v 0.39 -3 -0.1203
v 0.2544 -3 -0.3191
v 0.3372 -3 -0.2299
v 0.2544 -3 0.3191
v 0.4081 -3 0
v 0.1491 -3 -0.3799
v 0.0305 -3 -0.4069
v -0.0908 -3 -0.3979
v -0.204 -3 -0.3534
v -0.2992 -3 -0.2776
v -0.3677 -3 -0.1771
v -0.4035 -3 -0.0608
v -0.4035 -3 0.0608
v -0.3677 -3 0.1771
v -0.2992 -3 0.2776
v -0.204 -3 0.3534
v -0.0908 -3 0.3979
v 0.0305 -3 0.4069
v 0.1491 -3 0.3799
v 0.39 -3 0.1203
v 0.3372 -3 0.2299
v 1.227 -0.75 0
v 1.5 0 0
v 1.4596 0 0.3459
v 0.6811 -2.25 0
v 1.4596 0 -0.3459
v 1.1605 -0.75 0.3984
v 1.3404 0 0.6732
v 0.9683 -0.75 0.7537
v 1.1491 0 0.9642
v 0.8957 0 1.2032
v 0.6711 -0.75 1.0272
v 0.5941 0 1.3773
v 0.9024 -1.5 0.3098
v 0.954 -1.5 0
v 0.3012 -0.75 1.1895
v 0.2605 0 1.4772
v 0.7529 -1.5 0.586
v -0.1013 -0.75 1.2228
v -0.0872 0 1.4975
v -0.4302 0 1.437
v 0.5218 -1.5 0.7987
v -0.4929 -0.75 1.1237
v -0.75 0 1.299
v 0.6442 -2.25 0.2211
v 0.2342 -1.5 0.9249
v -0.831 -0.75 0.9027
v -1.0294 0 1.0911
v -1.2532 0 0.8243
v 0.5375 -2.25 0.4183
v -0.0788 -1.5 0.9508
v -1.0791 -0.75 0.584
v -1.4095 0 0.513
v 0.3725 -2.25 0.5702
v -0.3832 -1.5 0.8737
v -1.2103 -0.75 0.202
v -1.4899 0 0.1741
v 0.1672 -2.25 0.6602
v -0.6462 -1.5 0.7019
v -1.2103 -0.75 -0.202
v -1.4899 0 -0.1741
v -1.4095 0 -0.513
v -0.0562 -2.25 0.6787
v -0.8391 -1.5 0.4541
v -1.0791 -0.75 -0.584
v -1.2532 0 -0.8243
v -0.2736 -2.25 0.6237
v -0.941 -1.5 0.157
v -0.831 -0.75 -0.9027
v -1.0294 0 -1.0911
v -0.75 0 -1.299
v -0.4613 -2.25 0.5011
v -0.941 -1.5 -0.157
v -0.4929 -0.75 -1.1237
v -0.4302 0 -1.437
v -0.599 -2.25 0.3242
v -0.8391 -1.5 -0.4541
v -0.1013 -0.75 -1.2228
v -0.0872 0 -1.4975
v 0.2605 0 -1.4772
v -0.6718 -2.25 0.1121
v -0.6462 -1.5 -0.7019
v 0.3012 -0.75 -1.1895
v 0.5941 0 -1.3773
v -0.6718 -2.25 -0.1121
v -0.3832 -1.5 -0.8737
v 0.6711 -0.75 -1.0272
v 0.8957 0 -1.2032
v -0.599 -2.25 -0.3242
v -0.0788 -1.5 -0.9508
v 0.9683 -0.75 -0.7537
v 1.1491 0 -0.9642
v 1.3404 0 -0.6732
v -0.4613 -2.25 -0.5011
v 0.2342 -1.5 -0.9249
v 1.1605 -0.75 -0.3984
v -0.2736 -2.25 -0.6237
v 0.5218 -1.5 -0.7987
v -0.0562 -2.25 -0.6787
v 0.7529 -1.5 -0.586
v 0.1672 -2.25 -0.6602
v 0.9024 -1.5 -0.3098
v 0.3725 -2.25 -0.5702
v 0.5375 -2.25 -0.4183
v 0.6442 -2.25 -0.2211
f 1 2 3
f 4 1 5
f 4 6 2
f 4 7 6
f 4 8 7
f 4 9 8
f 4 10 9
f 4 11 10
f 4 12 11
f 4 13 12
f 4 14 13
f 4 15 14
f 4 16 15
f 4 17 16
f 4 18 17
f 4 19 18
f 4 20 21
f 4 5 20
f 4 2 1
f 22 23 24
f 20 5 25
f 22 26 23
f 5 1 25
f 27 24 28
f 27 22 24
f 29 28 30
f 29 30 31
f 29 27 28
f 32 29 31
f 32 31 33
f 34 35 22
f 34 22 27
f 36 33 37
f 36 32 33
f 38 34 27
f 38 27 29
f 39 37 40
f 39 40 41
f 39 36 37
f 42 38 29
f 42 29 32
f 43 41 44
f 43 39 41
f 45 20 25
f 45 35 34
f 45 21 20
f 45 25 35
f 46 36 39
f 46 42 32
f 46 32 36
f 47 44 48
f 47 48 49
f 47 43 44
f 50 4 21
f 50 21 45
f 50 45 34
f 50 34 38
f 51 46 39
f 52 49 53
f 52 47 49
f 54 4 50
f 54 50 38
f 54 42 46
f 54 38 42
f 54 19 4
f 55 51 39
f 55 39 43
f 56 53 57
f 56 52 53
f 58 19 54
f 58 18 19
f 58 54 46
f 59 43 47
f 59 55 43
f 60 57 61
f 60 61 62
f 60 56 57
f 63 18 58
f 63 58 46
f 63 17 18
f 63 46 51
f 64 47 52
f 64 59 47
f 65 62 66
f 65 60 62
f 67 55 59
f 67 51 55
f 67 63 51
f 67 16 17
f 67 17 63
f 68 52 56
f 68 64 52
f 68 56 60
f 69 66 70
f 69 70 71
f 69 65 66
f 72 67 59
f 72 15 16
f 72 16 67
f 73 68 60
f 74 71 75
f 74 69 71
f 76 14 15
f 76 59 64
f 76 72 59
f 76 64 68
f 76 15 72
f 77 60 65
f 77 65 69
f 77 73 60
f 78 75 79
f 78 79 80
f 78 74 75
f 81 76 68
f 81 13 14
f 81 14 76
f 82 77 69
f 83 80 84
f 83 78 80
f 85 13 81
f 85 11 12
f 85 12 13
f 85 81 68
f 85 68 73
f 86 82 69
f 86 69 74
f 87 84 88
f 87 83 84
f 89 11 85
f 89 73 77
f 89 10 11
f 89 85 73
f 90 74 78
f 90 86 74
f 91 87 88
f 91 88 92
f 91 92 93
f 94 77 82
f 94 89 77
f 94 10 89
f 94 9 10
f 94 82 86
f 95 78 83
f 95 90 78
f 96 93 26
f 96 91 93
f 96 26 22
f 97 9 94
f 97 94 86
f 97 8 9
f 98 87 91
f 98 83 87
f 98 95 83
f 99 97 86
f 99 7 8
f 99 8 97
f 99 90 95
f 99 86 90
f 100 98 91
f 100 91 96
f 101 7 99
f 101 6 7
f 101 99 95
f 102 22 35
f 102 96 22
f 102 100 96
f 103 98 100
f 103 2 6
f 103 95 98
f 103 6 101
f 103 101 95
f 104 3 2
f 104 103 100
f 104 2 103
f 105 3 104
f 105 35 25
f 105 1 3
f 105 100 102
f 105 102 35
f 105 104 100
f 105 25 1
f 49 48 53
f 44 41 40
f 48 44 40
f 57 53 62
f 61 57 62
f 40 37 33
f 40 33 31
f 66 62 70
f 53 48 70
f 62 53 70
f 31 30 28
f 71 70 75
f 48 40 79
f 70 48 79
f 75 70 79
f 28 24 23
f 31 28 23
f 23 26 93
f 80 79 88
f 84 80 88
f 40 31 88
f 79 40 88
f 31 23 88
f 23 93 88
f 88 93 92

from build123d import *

# Parameters (mm, degrees)
SKETCH1_W           = 203.69051182
SKETCH1_H           = 2
BASE_EXTRUDE_DEPTH  = 60
SKETCH3_R           = 1.5
BOSS_EXTRUDE1_DEPTH = 3
BOSS_EXTRUDE1_TAPER = 20
SKETCH4_W           = 120
SKETCH4_H           = 2
CUT_EXTRUDE1_DEPTH  = 213.364838441


with BuildPart() as part:
    # Sketch1 → Base-Extrude (new, symmetric)
    with BuildSketch(Plane.XY):
        with Locations((0, 1)):
            Rectangle(SKETCH1_W, SKETCH1_H)
    extrude(amount=BASE_EXTRUDE_DEPTH, both=True)

    # Sketch3 → Boss-Extrude1 (add)
    with BuildSketch(Plane.XZ):
        Circle(SKETCH3_R)
    extrude(amount=BOSS_EXTRUDE1_DEPTH, taper=BOSS_EXTRUDE1_TAPER)

    # Sketch4 → Cut-Extrude1 (cut, through all)
    with BuildSketch(Plane(origin=(101.84525591, 0, 0), x_dir=(0, 0, -1), z_dir=(1, 0, 0))):
        with Locations((0, 1)):
            Rectangle(SKETCH4_W, SKETCH4_H)
    extrude(amount=-CUT_EXTRUDE1_DEPTH, mode=Mode.SUBTRACT)


solid = part.part
